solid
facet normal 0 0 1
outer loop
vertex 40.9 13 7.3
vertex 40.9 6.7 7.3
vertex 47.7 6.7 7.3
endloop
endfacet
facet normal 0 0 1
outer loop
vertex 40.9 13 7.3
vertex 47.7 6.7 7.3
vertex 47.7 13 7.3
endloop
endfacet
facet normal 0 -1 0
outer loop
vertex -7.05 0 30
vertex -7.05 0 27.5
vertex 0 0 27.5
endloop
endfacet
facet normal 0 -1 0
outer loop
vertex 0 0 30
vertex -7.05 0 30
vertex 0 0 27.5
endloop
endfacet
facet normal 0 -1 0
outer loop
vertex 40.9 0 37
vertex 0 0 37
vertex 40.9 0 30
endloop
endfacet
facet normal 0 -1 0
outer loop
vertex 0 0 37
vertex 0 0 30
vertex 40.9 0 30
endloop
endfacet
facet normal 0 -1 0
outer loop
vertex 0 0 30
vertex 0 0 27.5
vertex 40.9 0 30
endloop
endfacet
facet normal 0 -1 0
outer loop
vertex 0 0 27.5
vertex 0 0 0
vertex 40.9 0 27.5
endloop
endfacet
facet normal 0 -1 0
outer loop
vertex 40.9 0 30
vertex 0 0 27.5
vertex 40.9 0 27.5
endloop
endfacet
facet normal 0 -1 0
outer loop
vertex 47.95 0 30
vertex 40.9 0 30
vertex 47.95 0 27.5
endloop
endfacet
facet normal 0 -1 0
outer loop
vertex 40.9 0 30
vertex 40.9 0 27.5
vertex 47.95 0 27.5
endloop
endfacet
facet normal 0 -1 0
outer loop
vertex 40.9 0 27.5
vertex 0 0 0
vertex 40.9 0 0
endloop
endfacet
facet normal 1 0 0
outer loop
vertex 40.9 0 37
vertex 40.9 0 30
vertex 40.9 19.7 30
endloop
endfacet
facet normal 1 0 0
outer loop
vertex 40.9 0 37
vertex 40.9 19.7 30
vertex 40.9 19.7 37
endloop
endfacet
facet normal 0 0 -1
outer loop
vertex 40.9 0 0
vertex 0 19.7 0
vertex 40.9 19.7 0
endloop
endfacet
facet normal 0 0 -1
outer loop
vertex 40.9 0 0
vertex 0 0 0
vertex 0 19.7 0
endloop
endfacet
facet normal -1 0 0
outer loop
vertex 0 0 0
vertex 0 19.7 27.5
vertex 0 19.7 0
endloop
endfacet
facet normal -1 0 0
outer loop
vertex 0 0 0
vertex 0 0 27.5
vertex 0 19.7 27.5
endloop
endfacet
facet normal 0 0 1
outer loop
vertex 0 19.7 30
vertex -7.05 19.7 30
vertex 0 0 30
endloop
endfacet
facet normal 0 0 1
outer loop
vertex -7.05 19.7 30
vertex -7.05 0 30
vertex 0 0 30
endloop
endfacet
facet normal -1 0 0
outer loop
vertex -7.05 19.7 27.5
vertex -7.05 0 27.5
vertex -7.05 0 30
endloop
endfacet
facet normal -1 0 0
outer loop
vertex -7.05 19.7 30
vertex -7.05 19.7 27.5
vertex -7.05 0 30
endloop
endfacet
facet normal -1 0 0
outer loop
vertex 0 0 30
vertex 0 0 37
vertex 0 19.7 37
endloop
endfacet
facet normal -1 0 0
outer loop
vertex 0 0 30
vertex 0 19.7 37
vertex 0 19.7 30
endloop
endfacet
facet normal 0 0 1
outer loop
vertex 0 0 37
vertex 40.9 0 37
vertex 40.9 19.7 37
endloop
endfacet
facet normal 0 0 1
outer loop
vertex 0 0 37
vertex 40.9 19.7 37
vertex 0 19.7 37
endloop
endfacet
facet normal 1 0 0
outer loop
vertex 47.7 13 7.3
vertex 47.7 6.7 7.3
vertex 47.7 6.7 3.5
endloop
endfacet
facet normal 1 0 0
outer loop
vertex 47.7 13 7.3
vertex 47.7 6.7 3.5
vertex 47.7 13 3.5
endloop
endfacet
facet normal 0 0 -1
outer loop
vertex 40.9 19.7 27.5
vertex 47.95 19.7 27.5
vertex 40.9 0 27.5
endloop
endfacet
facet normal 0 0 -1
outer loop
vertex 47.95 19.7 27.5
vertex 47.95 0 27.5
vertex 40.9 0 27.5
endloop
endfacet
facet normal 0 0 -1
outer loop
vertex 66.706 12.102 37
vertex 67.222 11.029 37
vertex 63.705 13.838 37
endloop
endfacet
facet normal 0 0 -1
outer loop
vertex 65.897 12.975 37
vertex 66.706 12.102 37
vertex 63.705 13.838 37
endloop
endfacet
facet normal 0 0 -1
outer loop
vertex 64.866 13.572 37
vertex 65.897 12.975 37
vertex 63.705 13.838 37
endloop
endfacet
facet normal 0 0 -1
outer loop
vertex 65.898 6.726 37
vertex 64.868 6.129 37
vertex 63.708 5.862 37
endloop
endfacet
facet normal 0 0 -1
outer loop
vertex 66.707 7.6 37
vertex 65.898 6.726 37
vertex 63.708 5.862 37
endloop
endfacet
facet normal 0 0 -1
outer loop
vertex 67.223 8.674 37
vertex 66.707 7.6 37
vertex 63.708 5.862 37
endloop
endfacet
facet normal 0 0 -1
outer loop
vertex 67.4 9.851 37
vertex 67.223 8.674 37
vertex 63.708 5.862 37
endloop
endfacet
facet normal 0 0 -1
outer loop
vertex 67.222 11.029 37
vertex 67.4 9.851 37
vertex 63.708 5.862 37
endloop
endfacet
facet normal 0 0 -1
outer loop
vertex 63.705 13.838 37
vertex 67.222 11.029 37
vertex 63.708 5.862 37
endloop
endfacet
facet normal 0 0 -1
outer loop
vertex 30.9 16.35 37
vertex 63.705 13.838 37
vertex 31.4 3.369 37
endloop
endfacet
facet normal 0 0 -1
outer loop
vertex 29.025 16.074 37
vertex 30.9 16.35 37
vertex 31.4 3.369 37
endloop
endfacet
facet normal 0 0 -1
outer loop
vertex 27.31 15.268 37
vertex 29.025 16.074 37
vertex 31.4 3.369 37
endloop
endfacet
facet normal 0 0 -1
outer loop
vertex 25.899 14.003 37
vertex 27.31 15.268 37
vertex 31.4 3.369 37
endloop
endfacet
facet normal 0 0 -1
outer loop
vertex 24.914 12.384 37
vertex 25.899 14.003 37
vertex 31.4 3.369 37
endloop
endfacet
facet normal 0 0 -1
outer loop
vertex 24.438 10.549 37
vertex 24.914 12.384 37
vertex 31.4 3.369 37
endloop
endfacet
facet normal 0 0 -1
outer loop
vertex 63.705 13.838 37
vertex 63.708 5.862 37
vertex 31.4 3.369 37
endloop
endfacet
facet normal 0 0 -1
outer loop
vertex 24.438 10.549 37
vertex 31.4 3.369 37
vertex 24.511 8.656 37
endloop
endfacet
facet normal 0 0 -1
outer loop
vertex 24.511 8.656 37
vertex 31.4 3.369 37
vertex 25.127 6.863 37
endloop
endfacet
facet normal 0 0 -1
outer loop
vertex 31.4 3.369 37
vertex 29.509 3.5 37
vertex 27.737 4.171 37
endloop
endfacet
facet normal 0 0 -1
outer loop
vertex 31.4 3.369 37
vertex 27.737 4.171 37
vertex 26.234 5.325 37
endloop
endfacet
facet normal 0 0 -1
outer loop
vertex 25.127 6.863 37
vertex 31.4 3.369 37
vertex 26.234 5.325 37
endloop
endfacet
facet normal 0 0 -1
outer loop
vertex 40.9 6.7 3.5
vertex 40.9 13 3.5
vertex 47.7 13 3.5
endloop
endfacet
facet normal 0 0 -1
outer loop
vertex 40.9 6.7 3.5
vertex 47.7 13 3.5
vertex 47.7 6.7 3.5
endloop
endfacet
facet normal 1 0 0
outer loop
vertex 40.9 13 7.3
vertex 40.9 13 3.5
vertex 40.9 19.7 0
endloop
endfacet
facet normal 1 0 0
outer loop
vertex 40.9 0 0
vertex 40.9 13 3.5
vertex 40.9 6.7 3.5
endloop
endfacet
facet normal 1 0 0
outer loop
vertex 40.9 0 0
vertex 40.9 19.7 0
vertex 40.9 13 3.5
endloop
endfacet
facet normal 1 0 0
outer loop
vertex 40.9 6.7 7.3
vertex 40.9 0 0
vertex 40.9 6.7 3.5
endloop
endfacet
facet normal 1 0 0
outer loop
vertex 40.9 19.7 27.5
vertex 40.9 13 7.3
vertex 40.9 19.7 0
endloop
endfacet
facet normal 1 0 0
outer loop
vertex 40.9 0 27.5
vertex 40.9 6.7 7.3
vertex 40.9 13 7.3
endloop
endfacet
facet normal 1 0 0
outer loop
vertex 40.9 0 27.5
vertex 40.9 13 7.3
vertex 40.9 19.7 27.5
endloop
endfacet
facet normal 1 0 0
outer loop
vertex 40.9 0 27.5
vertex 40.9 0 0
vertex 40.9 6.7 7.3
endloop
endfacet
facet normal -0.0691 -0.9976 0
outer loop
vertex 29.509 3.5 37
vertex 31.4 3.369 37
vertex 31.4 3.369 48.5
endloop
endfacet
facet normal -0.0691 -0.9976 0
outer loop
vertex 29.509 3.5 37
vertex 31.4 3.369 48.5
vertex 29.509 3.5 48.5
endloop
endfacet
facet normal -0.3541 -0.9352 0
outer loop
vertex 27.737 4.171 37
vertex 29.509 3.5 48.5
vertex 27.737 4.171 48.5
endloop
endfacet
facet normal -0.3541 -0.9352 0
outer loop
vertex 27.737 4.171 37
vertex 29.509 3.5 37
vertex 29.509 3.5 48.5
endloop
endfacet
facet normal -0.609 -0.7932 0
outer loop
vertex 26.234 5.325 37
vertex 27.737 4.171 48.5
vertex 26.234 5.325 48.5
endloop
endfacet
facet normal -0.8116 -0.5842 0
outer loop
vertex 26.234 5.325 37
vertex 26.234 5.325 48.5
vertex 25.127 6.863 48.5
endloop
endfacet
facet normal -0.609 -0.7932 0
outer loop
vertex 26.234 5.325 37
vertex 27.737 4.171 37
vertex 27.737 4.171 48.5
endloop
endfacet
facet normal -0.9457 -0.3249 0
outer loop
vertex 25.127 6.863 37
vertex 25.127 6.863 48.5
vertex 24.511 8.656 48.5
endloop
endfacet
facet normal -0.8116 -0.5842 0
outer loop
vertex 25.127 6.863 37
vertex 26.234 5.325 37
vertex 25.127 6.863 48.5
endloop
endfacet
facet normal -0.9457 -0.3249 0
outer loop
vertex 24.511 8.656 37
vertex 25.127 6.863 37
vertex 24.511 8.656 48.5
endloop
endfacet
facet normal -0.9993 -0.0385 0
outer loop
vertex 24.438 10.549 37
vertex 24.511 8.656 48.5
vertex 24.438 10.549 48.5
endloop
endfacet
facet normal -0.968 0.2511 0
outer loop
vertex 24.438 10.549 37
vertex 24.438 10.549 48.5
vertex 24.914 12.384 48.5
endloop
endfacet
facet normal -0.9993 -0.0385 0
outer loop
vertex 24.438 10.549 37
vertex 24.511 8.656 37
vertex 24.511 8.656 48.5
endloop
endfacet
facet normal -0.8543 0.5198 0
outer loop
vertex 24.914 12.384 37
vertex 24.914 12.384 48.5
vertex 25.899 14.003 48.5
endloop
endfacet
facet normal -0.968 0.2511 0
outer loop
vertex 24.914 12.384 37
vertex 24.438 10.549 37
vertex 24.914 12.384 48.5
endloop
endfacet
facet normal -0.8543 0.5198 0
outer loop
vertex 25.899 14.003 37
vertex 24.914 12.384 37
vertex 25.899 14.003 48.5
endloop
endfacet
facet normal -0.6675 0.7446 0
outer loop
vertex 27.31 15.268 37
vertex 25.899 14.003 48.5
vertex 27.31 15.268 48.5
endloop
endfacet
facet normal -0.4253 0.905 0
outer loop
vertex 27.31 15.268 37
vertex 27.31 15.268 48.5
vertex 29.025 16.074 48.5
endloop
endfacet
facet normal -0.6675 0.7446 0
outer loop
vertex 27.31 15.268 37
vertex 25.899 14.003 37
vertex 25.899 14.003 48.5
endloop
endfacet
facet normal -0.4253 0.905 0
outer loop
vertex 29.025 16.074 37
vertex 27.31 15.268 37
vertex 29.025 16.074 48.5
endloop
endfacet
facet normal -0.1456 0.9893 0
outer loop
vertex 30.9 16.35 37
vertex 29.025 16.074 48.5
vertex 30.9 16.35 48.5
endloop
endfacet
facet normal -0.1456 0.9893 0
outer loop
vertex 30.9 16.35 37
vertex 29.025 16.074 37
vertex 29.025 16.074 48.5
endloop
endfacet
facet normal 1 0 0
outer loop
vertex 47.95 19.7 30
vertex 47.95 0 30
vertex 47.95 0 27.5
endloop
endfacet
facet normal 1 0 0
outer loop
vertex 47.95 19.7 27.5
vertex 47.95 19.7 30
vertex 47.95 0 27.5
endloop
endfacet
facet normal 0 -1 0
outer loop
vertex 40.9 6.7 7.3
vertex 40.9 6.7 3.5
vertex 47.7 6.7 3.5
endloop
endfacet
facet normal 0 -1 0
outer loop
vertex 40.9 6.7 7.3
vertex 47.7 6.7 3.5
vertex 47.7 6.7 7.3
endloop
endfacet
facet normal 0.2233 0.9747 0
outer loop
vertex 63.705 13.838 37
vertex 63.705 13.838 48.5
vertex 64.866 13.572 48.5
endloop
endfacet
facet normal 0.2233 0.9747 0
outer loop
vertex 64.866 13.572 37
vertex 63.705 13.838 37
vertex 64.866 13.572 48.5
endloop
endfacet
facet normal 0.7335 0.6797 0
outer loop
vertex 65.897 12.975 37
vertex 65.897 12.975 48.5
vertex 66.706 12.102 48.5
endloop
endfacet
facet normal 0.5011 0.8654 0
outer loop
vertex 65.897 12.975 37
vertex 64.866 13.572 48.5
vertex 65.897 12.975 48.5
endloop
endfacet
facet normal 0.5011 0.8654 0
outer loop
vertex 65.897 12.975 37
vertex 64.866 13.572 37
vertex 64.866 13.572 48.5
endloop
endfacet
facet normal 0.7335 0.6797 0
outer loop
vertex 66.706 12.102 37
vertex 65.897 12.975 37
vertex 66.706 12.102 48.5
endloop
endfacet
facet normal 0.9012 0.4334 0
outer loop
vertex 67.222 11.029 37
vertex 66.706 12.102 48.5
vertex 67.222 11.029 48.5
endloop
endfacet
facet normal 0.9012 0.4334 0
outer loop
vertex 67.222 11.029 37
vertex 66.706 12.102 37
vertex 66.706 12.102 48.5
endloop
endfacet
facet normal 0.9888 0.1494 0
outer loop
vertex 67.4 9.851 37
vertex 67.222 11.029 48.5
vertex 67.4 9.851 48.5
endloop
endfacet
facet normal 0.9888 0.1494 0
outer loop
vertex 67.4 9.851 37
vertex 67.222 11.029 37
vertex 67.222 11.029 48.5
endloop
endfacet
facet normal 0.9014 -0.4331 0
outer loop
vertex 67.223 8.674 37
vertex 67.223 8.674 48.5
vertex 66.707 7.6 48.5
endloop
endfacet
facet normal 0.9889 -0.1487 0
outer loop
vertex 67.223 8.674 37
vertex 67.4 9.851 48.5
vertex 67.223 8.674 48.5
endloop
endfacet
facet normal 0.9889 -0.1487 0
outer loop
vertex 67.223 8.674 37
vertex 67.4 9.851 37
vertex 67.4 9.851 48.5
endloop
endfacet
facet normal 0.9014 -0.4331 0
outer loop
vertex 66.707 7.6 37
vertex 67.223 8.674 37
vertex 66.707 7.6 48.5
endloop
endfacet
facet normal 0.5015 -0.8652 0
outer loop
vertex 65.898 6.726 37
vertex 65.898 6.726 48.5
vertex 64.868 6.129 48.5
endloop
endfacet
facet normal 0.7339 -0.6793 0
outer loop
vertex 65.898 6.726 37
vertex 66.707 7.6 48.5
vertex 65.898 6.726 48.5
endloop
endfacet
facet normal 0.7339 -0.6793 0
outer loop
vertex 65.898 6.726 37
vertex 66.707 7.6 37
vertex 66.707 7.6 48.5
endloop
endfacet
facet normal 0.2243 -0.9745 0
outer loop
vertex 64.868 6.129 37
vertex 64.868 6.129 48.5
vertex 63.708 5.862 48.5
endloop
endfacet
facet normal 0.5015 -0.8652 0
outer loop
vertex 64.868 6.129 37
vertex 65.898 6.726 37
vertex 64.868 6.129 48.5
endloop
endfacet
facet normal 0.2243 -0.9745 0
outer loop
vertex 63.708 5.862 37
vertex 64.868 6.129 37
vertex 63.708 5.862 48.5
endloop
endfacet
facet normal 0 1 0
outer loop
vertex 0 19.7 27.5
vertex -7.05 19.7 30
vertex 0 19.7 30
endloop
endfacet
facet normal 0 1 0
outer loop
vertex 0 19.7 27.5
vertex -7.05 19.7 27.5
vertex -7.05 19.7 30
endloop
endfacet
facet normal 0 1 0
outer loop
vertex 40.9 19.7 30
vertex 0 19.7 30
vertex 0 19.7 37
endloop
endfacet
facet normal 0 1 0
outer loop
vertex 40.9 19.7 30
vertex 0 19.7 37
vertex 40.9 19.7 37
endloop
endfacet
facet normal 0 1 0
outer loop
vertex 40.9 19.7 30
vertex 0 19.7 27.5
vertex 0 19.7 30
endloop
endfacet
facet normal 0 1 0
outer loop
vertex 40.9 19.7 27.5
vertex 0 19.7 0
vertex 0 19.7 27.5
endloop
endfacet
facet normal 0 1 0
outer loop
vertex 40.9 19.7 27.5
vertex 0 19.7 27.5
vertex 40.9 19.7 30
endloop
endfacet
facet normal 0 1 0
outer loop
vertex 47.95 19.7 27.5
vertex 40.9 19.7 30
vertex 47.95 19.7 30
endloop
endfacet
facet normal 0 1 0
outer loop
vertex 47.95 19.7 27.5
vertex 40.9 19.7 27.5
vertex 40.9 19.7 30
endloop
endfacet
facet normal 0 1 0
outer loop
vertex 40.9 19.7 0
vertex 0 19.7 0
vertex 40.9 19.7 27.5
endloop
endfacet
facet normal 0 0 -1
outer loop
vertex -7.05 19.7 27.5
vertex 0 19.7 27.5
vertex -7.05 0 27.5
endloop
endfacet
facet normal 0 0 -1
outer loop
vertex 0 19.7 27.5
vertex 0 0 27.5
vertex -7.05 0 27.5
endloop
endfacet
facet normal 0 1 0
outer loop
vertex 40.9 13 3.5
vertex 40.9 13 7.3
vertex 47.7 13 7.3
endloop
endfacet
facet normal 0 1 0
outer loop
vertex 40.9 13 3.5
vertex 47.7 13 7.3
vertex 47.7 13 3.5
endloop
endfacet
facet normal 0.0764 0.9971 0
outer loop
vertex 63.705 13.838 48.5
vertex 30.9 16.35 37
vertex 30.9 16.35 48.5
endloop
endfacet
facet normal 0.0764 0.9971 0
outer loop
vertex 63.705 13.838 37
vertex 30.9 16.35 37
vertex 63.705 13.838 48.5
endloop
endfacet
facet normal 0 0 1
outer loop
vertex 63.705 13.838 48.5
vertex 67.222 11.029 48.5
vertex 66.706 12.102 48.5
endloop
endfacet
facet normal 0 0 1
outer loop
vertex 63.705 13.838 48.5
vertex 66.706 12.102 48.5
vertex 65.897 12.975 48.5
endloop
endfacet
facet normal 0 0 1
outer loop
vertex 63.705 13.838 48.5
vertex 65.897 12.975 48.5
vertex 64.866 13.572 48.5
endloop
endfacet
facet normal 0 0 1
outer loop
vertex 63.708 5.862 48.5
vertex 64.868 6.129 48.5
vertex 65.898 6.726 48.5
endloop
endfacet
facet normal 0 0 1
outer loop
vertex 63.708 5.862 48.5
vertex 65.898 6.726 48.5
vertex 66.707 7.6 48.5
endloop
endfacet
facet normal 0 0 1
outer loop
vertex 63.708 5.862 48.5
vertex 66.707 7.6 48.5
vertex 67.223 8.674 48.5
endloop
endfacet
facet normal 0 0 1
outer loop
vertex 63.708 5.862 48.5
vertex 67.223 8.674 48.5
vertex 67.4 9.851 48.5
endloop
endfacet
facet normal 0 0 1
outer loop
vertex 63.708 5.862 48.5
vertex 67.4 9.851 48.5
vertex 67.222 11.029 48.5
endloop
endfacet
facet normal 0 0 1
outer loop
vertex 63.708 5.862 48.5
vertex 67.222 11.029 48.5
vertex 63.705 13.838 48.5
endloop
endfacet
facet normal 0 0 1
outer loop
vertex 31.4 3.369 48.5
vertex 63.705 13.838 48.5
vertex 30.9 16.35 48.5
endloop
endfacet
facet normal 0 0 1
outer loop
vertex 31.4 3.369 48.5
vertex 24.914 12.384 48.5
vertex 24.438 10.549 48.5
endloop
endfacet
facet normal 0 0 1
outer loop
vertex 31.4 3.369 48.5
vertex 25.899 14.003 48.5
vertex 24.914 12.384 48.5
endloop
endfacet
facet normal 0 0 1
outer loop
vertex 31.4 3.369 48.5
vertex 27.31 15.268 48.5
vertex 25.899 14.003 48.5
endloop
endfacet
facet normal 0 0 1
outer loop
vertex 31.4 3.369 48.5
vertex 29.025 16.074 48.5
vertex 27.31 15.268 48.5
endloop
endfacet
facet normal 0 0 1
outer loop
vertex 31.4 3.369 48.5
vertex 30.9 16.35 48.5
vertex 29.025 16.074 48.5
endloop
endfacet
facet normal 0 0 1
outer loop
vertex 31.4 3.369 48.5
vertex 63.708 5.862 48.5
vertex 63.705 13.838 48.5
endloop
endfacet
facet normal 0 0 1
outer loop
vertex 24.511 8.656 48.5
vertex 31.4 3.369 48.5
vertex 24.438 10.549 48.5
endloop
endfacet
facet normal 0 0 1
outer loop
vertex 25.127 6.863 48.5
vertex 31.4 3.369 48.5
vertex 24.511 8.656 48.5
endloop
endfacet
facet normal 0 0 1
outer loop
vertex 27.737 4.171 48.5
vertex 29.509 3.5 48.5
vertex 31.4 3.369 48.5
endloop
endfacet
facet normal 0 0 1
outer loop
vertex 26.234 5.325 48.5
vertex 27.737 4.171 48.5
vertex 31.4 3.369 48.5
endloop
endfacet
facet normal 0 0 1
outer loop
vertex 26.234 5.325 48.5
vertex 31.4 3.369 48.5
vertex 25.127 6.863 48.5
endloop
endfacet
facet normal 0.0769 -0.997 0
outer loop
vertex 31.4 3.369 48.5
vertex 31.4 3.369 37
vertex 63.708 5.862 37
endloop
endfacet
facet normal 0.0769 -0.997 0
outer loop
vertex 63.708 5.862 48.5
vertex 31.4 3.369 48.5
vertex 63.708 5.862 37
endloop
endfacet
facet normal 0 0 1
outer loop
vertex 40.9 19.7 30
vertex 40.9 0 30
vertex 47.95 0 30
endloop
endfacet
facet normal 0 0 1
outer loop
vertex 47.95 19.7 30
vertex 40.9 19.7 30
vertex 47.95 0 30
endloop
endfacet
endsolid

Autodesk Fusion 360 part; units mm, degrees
sketch "Sketch3" plane through (0, 0, 0) normal (0, 1, 0) x (1, 0, 0)
  line L0 (0, 0) -> (40.9, 0)
  line L1 (40.9, 0) -> (40.9, -37)
  line L2 (40.9, -37) -> (0, -37)
  line L3 (0, -37) -> (0, 0)
  line L4 (-7.05, -30) -> (47.95, -30)
  line L5 (47.95, -30) -> (47.95, -27.5)
  line L6 (47.95, -27.5) -> (-7.05, -27.5)
  line L7 (-7.05, -27.5) -> (-7.05, -30)
  line L8 (20.45, 0) -> (20.45, -37) construction
  dimension "d8" = 40.9
  dimension "d9" = 37
  dimension "d10" = 2.5
  dimension "d11" = 27.5
  dimension "d12" = 55
  dimension "d13" = 27.5
extrude "Extrude2" add sketch "Sketch3" along normal blind 19.7 makes body 1
sketch "Sketch4" plane through (40.9, 0, 0) normal (1, 0, 0) x (0, 1, 0)
  line L0 (0, 27.5) -> (0, 0) construction
  line L1 (0, 0) -> (19.7, 0)
  line L2 (19.7, 0) -> (19.7, 27.5)
  line L3 (19.7, 27.5) -> (0, 27.5)
  line L4 (6.7, 7.3) -> (13, 7.3)
  line L5 (13, 7.3) -> (13, 3.5)
  line L6 (13, 3.5) -> (6.7, 3.5)
  line L7 (6.7, 3.5) -> (6.7, 7.3)
  line L8 (9.85, 0) -> (9.85, 21.995) construction
  dimension "d16" = 6.3
  dimension "d17" = 3.8
  dimension "d18" = 3.5
  dimension "d19" = 3.15
extrude "Extrude3" add sketch "Sketch4" along normal blind 6.8 bodies 1
sketch "Sketch5" plane through (0, 0, 37) normal (0, 0, 1) x (-1, 0, 0)
  line L0 (0, 0) -> (-40.9, 0)
  line L1 (-40.9, 0) -> (-40.9, -19.7)
  line L2 (-40.9, -19.7) -> (0, -19.7)
  line L3 (0, -19.7) -> (0, 0)
  line L4 (-40.9, -9.85) -> (-22.3906, -9.85) construction
  circle A0 centre (-30.9, -9.85) radius 6.5
  line L5 (-30.9, -9.85) -> (-63.4, -9.85) construction
  circle A1 centre (-63.4, -9.85) radius 4
  line L6 (-30.9, -9.85) -> (-30.9, -16.35) construction
  line L7 (-30.9, -16.35) -> (-63.7054, -13.8383)
  line L8 (-31.4, -3.3693) -> (-63.7077, -5.8619)
  dimension "d27" = 13
  dimension "d28" = 10
  dimension "d29" = 32.5
  dimension "d30" = 8
extrude "Extrude1" add sketch "Sketch5" along normal blind 11.5 separate body contours L1 A0 L7 L8 | L1 A1 L7 L8 | A0 L7 | A1 picked at (-31.6893, -8.3697) makes body 2 in component "Component"
component "Component" placed x (1, 0, 0) y (0, 1, 0) z (0, 0, 1) at (0, 0, 0)
